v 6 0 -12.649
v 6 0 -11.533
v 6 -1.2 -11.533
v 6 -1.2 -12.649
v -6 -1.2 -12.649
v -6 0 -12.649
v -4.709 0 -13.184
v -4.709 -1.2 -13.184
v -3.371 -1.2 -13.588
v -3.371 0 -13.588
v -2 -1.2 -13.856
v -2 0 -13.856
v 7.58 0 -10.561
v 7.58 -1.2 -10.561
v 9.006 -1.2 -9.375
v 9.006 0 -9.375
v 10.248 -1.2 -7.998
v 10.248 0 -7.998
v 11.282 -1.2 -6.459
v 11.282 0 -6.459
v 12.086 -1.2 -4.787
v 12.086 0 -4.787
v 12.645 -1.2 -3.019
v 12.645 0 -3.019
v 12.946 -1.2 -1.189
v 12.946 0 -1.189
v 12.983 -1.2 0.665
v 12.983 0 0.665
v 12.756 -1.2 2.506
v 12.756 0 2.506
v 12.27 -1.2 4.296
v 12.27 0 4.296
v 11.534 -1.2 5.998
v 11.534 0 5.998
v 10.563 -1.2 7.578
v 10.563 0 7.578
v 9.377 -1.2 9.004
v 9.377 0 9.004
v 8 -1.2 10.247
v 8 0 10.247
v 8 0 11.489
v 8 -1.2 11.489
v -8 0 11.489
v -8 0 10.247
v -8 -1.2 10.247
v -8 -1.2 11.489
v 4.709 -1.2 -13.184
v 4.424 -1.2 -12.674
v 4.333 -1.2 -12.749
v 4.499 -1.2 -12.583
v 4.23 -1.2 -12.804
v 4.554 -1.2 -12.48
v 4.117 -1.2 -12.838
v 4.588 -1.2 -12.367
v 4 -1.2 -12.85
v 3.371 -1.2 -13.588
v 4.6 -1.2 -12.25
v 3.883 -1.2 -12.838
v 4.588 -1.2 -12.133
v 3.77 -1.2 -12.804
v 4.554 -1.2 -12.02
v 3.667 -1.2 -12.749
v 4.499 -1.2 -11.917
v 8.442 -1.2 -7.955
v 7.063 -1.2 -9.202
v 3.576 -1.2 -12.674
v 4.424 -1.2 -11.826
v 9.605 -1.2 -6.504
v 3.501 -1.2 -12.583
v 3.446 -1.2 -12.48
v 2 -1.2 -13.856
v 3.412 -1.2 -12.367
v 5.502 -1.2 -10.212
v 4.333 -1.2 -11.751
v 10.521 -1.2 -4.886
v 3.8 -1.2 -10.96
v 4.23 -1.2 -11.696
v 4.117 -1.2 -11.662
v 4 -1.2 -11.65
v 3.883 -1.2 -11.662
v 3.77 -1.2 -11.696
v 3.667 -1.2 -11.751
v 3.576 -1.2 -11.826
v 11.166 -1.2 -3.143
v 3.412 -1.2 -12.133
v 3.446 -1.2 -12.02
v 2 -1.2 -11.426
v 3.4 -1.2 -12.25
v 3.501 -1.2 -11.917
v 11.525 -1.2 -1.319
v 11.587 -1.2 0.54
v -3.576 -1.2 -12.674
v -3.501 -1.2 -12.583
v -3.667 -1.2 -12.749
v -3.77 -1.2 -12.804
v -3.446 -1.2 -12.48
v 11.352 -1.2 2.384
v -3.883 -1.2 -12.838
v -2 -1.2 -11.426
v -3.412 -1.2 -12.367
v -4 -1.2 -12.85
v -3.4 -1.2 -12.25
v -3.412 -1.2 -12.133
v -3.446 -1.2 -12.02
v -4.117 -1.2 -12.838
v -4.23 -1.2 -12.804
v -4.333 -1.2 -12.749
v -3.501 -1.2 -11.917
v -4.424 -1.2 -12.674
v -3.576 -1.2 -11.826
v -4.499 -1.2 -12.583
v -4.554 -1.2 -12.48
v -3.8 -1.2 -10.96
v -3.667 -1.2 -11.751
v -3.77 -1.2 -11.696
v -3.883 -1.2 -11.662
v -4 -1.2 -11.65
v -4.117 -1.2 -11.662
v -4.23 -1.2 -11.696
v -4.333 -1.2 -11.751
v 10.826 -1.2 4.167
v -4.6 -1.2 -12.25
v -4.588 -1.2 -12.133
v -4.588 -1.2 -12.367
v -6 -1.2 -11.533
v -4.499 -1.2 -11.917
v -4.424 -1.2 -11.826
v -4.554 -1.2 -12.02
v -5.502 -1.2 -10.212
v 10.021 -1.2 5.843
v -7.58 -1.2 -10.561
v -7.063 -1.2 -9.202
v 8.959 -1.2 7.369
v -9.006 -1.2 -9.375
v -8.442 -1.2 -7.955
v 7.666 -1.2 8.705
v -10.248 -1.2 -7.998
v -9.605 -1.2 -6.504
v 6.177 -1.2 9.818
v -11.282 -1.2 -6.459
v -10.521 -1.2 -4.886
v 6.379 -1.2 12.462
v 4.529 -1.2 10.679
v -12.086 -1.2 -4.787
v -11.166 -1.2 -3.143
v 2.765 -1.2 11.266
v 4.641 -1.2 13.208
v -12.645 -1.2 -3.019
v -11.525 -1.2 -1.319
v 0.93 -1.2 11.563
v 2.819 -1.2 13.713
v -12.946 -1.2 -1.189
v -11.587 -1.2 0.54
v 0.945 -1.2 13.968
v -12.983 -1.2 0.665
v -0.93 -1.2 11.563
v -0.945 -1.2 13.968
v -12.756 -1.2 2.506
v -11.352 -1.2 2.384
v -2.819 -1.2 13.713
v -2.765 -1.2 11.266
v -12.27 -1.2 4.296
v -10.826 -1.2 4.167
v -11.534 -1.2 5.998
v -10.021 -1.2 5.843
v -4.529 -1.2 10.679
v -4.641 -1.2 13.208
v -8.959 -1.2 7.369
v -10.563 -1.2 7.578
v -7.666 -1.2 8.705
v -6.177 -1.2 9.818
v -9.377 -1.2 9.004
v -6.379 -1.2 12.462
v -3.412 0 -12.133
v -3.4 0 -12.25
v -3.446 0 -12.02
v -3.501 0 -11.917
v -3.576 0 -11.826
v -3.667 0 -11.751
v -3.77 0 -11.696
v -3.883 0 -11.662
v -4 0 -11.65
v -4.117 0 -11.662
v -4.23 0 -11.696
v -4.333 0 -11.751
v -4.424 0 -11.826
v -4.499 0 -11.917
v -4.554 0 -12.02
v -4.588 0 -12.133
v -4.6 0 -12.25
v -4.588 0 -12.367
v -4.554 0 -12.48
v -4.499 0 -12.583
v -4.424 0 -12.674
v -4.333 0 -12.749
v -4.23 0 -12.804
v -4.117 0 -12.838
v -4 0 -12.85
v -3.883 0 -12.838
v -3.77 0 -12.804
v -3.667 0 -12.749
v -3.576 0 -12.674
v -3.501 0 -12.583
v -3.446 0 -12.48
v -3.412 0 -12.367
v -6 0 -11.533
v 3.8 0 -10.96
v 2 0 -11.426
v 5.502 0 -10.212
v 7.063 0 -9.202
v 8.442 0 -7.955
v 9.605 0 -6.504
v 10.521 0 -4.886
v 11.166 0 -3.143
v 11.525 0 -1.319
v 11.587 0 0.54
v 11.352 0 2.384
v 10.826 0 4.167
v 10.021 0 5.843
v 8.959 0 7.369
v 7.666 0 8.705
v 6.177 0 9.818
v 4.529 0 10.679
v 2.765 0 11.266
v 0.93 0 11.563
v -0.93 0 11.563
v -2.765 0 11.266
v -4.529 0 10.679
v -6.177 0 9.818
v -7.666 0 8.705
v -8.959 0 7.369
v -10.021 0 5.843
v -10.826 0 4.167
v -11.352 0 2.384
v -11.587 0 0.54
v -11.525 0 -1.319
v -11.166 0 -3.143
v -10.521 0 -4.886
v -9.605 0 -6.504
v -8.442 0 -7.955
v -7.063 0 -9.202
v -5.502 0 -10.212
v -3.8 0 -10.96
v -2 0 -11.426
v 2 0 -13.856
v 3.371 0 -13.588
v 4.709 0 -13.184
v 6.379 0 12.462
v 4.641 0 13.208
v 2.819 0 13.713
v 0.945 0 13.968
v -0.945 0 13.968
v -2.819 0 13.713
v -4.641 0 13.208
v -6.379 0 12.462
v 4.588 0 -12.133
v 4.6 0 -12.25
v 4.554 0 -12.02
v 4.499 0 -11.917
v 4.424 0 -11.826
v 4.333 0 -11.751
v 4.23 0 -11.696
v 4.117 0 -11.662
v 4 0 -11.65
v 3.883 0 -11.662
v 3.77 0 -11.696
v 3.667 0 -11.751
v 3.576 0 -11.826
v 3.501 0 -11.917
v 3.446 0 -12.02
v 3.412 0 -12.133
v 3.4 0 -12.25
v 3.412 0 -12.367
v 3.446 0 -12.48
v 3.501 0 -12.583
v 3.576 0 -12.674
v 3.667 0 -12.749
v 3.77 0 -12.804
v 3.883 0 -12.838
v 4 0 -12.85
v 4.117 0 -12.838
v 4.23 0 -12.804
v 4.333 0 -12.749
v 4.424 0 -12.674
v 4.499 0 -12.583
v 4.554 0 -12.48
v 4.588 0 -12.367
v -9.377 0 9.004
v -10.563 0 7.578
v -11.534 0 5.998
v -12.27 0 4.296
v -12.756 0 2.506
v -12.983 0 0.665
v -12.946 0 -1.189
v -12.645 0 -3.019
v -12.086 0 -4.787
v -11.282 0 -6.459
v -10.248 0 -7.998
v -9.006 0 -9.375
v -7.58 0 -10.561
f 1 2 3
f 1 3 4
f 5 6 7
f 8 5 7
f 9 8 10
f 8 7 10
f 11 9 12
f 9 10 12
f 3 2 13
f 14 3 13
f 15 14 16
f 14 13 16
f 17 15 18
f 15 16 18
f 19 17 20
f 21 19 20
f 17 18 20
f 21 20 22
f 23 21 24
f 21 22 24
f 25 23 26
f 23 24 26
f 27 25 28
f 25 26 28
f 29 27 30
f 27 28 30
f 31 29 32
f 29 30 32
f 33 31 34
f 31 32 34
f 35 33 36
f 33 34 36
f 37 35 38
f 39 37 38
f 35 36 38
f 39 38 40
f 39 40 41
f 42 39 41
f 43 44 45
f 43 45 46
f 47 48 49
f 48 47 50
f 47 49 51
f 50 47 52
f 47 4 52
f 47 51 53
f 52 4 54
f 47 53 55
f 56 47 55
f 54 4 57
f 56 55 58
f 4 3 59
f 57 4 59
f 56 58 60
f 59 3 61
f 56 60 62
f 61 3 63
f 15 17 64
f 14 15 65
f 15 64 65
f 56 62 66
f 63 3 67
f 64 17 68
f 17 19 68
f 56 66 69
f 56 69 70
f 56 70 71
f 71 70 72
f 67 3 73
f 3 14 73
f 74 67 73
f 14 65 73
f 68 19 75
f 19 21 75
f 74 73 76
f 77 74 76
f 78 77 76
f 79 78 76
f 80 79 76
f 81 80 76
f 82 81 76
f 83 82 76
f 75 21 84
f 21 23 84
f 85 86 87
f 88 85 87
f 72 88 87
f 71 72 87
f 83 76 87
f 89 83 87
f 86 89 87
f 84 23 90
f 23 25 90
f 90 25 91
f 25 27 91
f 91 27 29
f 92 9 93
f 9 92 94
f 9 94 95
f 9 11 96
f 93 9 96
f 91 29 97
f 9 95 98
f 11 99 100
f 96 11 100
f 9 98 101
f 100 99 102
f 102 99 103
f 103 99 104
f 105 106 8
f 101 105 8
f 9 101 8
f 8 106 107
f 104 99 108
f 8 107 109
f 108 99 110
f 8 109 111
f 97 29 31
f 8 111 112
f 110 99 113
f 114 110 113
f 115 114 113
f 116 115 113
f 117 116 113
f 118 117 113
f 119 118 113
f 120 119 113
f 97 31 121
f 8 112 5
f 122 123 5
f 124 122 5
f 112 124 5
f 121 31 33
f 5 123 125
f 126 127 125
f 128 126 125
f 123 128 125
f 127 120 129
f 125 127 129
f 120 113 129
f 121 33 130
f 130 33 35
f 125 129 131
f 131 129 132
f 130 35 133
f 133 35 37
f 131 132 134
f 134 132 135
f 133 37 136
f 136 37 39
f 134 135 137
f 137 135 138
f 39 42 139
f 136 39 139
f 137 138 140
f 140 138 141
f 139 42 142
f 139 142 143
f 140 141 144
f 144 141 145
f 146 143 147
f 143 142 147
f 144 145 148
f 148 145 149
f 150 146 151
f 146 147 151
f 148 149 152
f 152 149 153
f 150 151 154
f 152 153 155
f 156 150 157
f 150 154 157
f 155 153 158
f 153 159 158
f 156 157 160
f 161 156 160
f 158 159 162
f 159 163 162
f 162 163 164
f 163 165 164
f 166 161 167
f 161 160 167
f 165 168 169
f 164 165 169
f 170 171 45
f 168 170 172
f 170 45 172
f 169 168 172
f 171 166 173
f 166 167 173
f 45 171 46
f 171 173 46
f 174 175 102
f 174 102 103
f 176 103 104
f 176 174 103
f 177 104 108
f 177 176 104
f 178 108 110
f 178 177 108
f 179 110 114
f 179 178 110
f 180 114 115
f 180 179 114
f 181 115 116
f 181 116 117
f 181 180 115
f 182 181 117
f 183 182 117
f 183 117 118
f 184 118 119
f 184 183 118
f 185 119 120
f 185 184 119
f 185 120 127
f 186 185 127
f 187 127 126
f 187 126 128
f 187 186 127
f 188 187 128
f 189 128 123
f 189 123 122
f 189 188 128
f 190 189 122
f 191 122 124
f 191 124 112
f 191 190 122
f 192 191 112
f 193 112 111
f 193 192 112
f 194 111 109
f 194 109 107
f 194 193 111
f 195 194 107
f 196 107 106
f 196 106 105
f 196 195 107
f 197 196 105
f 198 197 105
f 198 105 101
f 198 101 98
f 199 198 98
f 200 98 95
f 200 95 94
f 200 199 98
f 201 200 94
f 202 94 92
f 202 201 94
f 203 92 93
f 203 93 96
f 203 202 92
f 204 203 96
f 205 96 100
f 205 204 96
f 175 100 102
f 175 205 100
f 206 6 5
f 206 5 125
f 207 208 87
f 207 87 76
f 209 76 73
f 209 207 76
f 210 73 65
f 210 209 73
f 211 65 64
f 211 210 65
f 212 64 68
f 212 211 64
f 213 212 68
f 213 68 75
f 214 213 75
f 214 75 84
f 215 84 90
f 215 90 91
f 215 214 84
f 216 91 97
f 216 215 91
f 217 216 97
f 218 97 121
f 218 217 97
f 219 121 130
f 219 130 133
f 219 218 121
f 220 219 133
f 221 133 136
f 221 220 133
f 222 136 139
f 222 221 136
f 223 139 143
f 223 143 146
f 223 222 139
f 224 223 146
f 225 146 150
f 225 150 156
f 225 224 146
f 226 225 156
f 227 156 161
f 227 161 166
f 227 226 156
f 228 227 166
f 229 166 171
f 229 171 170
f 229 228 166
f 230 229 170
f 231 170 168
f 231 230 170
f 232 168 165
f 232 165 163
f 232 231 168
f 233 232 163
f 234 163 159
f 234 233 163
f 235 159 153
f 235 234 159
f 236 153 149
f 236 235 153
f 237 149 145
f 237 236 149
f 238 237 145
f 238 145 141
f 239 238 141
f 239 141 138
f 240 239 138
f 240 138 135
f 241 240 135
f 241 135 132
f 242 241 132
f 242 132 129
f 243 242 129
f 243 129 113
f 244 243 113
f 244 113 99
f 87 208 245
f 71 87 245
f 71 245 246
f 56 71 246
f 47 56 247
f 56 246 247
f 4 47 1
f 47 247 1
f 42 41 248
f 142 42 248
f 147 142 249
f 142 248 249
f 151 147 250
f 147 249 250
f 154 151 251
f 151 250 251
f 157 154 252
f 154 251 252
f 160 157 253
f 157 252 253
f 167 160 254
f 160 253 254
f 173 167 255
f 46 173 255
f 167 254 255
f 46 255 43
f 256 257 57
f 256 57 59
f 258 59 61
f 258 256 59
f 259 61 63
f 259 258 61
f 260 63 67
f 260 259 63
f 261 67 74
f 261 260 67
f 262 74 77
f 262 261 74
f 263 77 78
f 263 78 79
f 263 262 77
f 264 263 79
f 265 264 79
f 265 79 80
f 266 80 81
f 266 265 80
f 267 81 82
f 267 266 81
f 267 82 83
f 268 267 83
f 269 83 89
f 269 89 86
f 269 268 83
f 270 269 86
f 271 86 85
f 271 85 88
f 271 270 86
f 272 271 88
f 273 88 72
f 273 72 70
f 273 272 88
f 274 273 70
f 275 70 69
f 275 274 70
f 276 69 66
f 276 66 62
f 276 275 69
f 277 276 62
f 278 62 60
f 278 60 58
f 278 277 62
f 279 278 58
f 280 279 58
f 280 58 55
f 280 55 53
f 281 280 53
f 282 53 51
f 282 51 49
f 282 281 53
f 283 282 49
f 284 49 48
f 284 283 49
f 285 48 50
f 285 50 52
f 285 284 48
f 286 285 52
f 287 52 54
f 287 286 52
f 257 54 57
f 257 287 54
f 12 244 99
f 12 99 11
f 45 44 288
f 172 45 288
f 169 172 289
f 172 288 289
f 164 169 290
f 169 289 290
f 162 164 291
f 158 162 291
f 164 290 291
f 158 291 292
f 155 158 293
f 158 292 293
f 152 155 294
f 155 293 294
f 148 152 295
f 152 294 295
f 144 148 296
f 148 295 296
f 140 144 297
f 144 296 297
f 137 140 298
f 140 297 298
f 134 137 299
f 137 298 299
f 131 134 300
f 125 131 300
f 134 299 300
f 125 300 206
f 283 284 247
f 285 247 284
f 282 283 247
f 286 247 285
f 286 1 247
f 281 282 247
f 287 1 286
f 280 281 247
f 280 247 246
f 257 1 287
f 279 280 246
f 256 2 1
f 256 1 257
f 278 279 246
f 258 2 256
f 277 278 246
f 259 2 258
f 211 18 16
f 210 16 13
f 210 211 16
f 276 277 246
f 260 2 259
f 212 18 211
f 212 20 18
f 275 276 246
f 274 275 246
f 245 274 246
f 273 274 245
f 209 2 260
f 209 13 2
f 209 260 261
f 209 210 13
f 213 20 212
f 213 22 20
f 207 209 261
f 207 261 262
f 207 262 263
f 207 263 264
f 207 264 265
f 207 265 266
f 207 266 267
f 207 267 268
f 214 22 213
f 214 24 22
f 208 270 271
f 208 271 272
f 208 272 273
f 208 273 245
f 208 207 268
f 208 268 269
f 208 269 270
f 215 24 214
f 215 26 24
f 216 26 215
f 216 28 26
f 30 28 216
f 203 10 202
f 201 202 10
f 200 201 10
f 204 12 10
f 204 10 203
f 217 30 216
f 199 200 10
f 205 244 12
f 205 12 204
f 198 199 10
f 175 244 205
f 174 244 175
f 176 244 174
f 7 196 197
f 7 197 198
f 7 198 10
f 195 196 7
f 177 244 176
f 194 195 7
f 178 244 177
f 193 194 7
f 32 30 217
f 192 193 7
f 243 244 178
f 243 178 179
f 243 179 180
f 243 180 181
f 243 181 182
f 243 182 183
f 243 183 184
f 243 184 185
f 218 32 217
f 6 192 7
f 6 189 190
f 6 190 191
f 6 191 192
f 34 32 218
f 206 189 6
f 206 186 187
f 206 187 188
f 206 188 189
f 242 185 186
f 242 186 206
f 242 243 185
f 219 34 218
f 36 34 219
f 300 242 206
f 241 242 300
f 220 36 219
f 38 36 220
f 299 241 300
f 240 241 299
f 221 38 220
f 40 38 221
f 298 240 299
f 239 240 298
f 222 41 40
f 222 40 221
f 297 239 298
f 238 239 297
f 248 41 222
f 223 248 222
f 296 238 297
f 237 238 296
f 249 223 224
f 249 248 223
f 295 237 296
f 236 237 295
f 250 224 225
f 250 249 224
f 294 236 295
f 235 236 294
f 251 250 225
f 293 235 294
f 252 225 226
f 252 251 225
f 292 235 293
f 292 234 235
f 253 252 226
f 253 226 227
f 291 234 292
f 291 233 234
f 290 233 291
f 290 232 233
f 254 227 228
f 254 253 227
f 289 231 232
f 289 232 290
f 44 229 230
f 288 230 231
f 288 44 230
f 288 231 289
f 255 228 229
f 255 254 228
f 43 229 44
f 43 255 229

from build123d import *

# Parameters (mm, degrees)
SKETCH_R  = 0.6
PAD_DEPTH = 1.2


with BuildPart() as part:
    # Sketch → Pad (new body)
    with BuildSketch(Plane.XZ):
        with BuildLine():
            ThreePointArc((2, -11.426285), (0, 11.6), (-2, -11.426285))
            Line((-2, -11.426285), (-2, -13.856406))
            ThreePointArc((-6, -12.649111), (-4.045292, -13.402821), (-2, -13.856406))
            Line((-6, -12.649111), (-6, -11.532563))
            ThreePointArc((-8, 10.246951), (-12.945532, -1.188781), (-6, -11.532563))
            Line((-8, 10.246951), (-8, 11.489125))
            ThreePointArc((8, 11.489125), (0, 14), (-8, 11.489125))
            Line((8, 10.246951), (8, 11.489125))
            ThreePointArc((6, -11.532563), (12.945532, -1.188781), (8, 10.246951))
            Line((6, -11.532563), (6, -12.649111))
            ThreePointArc((2, -13.856406), (4.045292, -13.402821), (6, -12.649111))
            Line((2, -11.426285), (2, -13.856406))
        make_face()
        with Locations((-4, -12.25)):
            Circle(SKETCH_R, mode=Mode.SUBTRACT)
        with Locations((4, -12.25)):
            Circle(SKETCH_R, mode=Mode.SUBTRACT)
    extrude(amount=PAD_DEPTH)


solid = part.part
